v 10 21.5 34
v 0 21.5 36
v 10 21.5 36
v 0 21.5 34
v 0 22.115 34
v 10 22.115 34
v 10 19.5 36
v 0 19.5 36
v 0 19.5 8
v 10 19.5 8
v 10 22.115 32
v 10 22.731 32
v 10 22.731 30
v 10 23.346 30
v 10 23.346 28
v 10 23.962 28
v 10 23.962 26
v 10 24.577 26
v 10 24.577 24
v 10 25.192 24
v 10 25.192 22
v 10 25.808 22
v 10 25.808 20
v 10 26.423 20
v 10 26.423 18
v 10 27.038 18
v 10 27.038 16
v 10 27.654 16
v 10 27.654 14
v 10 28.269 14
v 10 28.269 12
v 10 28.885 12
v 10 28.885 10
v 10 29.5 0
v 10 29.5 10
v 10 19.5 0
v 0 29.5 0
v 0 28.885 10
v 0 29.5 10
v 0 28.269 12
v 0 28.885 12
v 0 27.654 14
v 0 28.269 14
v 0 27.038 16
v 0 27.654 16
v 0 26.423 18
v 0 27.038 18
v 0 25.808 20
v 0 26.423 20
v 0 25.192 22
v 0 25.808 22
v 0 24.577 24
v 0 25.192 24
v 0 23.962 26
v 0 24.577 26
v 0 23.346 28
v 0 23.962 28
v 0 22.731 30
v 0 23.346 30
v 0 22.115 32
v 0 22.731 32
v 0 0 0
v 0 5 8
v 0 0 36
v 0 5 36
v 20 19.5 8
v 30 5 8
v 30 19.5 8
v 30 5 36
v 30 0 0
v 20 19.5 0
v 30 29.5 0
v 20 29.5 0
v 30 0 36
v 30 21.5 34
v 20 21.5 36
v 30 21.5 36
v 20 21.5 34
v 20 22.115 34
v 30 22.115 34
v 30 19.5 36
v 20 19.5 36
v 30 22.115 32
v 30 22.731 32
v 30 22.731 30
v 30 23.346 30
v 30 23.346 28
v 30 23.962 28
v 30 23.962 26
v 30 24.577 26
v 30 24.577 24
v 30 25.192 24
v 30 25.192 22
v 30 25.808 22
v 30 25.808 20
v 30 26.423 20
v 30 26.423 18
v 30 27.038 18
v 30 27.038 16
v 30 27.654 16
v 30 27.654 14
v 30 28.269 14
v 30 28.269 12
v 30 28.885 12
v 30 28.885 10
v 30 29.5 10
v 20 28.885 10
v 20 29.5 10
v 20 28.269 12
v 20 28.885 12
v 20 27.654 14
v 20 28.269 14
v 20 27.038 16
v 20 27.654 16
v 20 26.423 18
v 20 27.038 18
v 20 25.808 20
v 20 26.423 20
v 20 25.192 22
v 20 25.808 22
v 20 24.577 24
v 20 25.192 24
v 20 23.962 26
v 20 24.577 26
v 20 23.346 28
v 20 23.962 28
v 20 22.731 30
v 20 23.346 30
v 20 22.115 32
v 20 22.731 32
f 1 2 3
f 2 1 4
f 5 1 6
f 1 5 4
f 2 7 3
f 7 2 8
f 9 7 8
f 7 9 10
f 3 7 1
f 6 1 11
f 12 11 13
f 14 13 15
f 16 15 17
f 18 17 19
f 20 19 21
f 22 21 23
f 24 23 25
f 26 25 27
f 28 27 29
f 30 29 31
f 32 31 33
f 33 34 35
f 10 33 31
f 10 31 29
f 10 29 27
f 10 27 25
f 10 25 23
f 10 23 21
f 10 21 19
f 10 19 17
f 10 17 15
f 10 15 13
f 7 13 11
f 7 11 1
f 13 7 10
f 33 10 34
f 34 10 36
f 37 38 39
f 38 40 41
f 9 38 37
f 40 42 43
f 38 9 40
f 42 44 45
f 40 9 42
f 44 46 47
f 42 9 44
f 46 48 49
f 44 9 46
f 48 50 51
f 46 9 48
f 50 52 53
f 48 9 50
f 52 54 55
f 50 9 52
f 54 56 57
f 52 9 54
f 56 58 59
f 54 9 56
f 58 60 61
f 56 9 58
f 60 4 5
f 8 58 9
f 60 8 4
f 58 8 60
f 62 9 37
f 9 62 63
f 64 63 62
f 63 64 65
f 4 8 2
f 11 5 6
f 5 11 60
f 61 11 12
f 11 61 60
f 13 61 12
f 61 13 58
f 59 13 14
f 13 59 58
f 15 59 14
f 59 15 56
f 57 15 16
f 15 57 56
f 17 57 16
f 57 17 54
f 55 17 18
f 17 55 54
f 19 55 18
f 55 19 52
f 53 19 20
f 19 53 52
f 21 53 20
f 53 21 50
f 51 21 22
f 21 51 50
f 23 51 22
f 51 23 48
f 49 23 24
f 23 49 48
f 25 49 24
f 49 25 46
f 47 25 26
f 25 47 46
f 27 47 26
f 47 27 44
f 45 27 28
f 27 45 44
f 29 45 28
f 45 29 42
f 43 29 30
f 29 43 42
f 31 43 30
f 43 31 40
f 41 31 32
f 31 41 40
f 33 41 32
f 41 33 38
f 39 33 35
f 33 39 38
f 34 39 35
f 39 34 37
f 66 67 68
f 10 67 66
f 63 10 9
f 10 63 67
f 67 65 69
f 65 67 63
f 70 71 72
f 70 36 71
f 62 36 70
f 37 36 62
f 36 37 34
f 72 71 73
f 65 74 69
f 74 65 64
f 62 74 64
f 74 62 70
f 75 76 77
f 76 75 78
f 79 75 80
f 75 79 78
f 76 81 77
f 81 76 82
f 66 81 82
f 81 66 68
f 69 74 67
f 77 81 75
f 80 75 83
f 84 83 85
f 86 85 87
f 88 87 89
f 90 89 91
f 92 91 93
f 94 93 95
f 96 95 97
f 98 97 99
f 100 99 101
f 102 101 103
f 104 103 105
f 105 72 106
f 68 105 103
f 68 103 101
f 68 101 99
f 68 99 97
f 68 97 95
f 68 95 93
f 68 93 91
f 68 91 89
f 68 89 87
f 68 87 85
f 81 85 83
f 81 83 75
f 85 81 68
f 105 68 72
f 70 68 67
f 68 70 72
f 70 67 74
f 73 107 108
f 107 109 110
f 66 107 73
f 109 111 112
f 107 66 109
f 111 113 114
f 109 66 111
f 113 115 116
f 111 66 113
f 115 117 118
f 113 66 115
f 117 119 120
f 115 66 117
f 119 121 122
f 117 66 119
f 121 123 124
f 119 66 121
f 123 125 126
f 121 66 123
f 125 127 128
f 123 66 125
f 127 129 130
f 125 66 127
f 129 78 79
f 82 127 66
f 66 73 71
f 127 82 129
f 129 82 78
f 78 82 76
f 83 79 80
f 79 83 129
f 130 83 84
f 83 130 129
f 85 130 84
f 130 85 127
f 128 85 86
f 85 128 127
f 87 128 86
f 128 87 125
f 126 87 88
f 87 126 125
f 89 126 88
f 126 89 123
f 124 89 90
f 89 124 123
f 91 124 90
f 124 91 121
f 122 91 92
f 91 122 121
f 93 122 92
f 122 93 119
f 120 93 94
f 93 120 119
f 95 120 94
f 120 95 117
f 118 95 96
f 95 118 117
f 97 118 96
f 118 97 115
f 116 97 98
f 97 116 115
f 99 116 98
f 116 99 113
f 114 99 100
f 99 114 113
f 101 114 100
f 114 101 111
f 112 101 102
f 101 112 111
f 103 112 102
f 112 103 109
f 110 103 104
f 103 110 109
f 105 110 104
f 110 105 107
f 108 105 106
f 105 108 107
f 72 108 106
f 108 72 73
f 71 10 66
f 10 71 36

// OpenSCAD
gap_bridge = 14.5;
depth = 28;
height_top = 8;

thickness_flat = 5;
thickness_wedge_tip = 2;
thickness_wedge_base = 10;
wedge_n_steps = 14; // should divide depth into a multiple of your step height, or use 0 for smooth ramp

width_prong = 10;
gap_prongs = 10;


module wedge() {
  wedge_x_lo = thickness_flat + gap_bridge;
  wedge_x_hi_z_lo = wedge_x_lo + thickness_wedge_tip;
  wedge_x_hi_z_hi = wedge_x_lo + thickness_wedge_base;


  union() {
    cube([thickness_flat, width_prong, depth + height_top]);
    translate([thickness_flat, 0, depth]) cube([gap_bridge, width_prong, height_top]);
    ramp(wedge_n_steps, wedge_x_lo, wedge_x_hi_z_lo, wedge_x_hi_z_hi);
    translate([wedge_x_lo, 0, depth]) cube([thickness_wedge_base, width_prong, height_top]);
  };
};

module ramp(n_steps, x_lo, x_hi_z_lo, x_hi_z_hi) {
  if(n_steps < 1) {
    polyhedron(
      [
        [x_lo, 0, 0],
        [x_hi_z_lo, 0, 0],
        [x_hi_z_lo, width_prong, 0],
        [x_lo, width_prong, 0],
        [x_lo, 0, depth],
        [x_hi_z_hi, 0, depth],
        [x_hi_z_hi, width_prong, depth],
        [x_lo, width_prong, depth],
      ],
      [
        [0,1,2,3],
        [4,5,1,0],
        [7,6,5,4],
        [5,6,2,1],
        [6,7,3,2],
        [7,4,0,3],
      ]
    );
  } else {
    z_step = depth / n_steps;
    x_min = x_hi_z_lo - x_lo;
    x_step = (x_hi_z_hi - x_hi_z_lo) / (wedge_n_steps-1);
    translate([x_hi_z_lo-x_min,0,0]) for (i = [0:1:(n_steps-1)]) {
      translate([0,0,i*z_step]) cube([i*x_step+x_min, width_prong, z_step], center=false);
    };
  }
}



module double() {  
  translate([0,0,depth+height_top]) rotate([0, 180, 270]) union() {
    wedge();
    translate([0, (gap_prongs+width_prong), 0]) wedge();
    translate([0, width_prong, depth]) cube([gap_bridge + thickness_flat, gap_prongs, height_top]);
    translate([0, width_prong, 0]) cube([thickness_flat, gap_prongs, depth]);
  };
};
  
module single() {
  rotate([90, 0,0]) wedge();
}

echo(str("the step height is ", depth / wedge_n_steps, " which should be a multiple of your layer height"));
//single();
double();
